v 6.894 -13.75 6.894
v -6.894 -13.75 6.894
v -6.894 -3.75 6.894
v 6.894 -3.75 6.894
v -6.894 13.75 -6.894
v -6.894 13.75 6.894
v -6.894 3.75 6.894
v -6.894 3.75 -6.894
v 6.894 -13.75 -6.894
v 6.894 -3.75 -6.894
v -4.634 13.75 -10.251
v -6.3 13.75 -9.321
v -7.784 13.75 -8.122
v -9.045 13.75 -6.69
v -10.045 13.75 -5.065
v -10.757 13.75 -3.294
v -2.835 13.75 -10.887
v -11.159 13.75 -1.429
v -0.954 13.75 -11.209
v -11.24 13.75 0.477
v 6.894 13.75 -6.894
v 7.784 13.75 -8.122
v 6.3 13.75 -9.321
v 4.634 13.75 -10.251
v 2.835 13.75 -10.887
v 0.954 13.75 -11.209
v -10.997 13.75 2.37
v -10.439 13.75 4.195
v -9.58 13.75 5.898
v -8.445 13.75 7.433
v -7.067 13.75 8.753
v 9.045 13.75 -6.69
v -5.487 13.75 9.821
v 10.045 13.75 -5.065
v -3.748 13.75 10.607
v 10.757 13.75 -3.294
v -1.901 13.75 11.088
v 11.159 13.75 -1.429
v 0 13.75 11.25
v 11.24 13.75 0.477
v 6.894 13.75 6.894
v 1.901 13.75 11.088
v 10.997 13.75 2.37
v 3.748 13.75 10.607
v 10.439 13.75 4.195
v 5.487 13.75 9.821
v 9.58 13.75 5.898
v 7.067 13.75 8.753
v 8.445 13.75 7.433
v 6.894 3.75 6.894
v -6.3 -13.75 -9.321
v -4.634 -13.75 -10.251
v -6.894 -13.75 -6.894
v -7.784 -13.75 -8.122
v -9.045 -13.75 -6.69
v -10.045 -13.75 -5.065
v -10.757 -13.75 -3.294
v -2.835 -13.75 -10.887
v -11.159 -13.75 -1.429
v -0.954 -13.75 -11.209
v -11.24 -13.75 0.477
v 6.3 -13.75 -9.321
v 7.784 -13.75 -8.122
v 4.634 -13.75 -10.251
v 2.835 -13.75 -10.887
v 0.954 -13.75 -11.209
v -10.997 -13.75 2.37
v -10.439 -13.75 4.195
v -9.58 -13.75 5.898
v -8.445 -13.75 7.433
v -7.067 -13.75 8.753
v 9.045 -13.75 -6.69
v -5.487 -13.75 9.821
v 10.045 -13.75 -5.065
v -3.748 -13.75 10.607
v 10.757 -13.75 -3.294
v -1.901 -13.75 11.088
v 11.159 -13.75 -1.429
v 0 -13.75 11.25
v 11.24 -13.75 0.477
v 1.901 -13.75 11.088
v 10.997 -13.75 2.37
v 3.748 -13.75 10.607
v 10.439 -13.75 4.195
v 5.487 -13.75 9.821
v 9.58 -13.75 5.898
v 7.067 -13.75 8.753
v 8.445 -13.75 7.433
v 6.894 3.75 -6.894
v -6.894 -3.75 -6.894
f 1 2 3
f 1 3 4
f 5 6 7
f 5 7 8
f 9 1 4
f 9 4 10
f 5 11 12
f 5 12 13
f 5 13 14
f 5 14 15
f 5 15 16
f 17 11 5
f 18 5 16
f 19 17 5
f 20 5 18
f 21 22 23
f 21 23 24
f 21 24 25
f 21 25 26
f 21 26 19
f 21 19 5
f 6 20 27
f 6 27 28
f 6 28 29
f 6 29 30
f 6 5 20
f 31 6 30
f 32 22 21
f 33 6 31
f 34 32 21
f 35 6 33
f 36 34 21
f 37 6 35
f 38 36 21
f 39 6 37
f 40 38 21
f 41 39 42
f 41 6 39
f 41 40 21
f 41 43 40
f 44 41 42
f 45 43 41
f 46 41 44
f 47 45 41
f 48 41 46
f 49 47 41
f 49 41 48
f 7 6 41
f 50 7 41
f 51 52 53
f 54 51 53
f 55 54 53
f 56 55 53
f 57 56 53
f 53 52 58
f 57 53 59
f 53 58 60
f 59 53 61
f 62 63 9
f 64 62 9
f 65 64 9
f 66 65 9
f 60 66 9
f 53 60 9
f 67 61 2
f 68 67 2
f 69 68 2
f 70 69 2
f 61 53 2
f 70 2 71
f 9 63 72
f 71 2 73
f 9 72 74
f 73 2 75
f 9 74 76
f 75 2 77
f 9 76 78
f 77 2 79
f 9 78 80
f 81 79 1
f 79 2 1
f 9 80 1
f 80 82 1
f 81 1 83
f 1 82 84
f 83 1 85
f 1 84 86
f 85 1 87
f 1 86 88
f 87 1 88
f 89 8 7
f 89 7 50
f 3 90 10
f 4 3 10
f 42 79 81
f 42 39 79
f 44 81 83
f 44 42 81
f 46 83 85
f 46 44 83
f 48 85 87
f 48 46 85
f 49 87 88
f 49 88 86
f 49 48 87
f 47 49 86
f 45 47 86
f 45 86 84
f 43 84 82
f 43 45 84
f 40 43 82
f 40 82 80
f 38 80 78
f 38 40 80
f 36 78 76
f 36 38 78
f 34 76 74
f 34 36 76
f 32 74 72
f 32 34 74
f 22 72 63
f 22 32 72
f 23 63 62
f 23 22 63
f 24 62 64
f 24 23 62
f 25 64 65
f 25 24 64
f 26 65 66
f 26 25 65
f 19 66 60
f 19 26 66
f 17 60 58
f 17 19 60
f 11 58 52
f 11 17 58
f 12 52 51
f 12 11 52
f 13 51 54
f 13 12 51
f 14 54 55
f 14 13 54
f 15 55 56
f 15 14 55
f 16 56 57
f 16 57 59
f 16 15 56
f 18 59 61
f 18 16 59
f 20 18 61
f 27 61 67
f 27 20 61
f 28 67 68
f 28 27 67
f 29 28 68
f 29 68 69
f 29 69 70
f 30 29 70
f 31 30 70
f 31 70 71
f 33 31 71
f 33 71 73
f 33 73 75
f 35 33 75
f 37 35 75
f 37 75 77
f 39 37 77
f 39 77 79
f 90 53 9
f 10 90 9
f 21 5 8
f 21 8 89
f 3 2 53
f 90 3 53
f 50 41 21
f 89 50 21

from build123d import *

# Parameters (mm, degrees)
ESQUISSE1_R             = 11.25
BOSS_EXTRU_1_DEPTH      = 13.75
ESQUISSE3_W             = 13.788582234
ESQUISSE3_H             = 13.788582234
ENL_V_MAT_EXTRU_3_DEPTH = 10


with BuildPart() as part:
    # Esquisse1 → Boss.-Extru.1 (new, symmetric)
    with BuildSketch(Plane(origin=(0, 0, 0), x_dir=(1, 0, 0), z_dir=(0, 1, 0))):
        with Locations(Location((0, 0, 0), (0, 0, 270))):
            Circle(ESQUISSE1_R)
    extrude(amount=BOSS_EXTRU_1_DEPTH, both=True)

    # Esquisse3 → Enlèv. mat.-Extru.3 (cut)
    with BuildSketch(Plane(origin=(0, 13.75, 0), x_dir=(1, 0, 0), z_dir=(0, 1, 0))):
        Rectangle(ESQUISSE3_W, ESQUISSE3_H)
    enl_v_mat_extru_3 = extrude(amount=-ENL_V_MAT_EXTRU_3_DEPTH, mode=Mode.SUBTRACT)

    # Symétrie1: Enlèv. mat.-Extru.3 across plane
    add(enl_v_mat_extru_3.mirror(Plane.ZX), mode=Mode.SUBTRACT)


solid = part.part
